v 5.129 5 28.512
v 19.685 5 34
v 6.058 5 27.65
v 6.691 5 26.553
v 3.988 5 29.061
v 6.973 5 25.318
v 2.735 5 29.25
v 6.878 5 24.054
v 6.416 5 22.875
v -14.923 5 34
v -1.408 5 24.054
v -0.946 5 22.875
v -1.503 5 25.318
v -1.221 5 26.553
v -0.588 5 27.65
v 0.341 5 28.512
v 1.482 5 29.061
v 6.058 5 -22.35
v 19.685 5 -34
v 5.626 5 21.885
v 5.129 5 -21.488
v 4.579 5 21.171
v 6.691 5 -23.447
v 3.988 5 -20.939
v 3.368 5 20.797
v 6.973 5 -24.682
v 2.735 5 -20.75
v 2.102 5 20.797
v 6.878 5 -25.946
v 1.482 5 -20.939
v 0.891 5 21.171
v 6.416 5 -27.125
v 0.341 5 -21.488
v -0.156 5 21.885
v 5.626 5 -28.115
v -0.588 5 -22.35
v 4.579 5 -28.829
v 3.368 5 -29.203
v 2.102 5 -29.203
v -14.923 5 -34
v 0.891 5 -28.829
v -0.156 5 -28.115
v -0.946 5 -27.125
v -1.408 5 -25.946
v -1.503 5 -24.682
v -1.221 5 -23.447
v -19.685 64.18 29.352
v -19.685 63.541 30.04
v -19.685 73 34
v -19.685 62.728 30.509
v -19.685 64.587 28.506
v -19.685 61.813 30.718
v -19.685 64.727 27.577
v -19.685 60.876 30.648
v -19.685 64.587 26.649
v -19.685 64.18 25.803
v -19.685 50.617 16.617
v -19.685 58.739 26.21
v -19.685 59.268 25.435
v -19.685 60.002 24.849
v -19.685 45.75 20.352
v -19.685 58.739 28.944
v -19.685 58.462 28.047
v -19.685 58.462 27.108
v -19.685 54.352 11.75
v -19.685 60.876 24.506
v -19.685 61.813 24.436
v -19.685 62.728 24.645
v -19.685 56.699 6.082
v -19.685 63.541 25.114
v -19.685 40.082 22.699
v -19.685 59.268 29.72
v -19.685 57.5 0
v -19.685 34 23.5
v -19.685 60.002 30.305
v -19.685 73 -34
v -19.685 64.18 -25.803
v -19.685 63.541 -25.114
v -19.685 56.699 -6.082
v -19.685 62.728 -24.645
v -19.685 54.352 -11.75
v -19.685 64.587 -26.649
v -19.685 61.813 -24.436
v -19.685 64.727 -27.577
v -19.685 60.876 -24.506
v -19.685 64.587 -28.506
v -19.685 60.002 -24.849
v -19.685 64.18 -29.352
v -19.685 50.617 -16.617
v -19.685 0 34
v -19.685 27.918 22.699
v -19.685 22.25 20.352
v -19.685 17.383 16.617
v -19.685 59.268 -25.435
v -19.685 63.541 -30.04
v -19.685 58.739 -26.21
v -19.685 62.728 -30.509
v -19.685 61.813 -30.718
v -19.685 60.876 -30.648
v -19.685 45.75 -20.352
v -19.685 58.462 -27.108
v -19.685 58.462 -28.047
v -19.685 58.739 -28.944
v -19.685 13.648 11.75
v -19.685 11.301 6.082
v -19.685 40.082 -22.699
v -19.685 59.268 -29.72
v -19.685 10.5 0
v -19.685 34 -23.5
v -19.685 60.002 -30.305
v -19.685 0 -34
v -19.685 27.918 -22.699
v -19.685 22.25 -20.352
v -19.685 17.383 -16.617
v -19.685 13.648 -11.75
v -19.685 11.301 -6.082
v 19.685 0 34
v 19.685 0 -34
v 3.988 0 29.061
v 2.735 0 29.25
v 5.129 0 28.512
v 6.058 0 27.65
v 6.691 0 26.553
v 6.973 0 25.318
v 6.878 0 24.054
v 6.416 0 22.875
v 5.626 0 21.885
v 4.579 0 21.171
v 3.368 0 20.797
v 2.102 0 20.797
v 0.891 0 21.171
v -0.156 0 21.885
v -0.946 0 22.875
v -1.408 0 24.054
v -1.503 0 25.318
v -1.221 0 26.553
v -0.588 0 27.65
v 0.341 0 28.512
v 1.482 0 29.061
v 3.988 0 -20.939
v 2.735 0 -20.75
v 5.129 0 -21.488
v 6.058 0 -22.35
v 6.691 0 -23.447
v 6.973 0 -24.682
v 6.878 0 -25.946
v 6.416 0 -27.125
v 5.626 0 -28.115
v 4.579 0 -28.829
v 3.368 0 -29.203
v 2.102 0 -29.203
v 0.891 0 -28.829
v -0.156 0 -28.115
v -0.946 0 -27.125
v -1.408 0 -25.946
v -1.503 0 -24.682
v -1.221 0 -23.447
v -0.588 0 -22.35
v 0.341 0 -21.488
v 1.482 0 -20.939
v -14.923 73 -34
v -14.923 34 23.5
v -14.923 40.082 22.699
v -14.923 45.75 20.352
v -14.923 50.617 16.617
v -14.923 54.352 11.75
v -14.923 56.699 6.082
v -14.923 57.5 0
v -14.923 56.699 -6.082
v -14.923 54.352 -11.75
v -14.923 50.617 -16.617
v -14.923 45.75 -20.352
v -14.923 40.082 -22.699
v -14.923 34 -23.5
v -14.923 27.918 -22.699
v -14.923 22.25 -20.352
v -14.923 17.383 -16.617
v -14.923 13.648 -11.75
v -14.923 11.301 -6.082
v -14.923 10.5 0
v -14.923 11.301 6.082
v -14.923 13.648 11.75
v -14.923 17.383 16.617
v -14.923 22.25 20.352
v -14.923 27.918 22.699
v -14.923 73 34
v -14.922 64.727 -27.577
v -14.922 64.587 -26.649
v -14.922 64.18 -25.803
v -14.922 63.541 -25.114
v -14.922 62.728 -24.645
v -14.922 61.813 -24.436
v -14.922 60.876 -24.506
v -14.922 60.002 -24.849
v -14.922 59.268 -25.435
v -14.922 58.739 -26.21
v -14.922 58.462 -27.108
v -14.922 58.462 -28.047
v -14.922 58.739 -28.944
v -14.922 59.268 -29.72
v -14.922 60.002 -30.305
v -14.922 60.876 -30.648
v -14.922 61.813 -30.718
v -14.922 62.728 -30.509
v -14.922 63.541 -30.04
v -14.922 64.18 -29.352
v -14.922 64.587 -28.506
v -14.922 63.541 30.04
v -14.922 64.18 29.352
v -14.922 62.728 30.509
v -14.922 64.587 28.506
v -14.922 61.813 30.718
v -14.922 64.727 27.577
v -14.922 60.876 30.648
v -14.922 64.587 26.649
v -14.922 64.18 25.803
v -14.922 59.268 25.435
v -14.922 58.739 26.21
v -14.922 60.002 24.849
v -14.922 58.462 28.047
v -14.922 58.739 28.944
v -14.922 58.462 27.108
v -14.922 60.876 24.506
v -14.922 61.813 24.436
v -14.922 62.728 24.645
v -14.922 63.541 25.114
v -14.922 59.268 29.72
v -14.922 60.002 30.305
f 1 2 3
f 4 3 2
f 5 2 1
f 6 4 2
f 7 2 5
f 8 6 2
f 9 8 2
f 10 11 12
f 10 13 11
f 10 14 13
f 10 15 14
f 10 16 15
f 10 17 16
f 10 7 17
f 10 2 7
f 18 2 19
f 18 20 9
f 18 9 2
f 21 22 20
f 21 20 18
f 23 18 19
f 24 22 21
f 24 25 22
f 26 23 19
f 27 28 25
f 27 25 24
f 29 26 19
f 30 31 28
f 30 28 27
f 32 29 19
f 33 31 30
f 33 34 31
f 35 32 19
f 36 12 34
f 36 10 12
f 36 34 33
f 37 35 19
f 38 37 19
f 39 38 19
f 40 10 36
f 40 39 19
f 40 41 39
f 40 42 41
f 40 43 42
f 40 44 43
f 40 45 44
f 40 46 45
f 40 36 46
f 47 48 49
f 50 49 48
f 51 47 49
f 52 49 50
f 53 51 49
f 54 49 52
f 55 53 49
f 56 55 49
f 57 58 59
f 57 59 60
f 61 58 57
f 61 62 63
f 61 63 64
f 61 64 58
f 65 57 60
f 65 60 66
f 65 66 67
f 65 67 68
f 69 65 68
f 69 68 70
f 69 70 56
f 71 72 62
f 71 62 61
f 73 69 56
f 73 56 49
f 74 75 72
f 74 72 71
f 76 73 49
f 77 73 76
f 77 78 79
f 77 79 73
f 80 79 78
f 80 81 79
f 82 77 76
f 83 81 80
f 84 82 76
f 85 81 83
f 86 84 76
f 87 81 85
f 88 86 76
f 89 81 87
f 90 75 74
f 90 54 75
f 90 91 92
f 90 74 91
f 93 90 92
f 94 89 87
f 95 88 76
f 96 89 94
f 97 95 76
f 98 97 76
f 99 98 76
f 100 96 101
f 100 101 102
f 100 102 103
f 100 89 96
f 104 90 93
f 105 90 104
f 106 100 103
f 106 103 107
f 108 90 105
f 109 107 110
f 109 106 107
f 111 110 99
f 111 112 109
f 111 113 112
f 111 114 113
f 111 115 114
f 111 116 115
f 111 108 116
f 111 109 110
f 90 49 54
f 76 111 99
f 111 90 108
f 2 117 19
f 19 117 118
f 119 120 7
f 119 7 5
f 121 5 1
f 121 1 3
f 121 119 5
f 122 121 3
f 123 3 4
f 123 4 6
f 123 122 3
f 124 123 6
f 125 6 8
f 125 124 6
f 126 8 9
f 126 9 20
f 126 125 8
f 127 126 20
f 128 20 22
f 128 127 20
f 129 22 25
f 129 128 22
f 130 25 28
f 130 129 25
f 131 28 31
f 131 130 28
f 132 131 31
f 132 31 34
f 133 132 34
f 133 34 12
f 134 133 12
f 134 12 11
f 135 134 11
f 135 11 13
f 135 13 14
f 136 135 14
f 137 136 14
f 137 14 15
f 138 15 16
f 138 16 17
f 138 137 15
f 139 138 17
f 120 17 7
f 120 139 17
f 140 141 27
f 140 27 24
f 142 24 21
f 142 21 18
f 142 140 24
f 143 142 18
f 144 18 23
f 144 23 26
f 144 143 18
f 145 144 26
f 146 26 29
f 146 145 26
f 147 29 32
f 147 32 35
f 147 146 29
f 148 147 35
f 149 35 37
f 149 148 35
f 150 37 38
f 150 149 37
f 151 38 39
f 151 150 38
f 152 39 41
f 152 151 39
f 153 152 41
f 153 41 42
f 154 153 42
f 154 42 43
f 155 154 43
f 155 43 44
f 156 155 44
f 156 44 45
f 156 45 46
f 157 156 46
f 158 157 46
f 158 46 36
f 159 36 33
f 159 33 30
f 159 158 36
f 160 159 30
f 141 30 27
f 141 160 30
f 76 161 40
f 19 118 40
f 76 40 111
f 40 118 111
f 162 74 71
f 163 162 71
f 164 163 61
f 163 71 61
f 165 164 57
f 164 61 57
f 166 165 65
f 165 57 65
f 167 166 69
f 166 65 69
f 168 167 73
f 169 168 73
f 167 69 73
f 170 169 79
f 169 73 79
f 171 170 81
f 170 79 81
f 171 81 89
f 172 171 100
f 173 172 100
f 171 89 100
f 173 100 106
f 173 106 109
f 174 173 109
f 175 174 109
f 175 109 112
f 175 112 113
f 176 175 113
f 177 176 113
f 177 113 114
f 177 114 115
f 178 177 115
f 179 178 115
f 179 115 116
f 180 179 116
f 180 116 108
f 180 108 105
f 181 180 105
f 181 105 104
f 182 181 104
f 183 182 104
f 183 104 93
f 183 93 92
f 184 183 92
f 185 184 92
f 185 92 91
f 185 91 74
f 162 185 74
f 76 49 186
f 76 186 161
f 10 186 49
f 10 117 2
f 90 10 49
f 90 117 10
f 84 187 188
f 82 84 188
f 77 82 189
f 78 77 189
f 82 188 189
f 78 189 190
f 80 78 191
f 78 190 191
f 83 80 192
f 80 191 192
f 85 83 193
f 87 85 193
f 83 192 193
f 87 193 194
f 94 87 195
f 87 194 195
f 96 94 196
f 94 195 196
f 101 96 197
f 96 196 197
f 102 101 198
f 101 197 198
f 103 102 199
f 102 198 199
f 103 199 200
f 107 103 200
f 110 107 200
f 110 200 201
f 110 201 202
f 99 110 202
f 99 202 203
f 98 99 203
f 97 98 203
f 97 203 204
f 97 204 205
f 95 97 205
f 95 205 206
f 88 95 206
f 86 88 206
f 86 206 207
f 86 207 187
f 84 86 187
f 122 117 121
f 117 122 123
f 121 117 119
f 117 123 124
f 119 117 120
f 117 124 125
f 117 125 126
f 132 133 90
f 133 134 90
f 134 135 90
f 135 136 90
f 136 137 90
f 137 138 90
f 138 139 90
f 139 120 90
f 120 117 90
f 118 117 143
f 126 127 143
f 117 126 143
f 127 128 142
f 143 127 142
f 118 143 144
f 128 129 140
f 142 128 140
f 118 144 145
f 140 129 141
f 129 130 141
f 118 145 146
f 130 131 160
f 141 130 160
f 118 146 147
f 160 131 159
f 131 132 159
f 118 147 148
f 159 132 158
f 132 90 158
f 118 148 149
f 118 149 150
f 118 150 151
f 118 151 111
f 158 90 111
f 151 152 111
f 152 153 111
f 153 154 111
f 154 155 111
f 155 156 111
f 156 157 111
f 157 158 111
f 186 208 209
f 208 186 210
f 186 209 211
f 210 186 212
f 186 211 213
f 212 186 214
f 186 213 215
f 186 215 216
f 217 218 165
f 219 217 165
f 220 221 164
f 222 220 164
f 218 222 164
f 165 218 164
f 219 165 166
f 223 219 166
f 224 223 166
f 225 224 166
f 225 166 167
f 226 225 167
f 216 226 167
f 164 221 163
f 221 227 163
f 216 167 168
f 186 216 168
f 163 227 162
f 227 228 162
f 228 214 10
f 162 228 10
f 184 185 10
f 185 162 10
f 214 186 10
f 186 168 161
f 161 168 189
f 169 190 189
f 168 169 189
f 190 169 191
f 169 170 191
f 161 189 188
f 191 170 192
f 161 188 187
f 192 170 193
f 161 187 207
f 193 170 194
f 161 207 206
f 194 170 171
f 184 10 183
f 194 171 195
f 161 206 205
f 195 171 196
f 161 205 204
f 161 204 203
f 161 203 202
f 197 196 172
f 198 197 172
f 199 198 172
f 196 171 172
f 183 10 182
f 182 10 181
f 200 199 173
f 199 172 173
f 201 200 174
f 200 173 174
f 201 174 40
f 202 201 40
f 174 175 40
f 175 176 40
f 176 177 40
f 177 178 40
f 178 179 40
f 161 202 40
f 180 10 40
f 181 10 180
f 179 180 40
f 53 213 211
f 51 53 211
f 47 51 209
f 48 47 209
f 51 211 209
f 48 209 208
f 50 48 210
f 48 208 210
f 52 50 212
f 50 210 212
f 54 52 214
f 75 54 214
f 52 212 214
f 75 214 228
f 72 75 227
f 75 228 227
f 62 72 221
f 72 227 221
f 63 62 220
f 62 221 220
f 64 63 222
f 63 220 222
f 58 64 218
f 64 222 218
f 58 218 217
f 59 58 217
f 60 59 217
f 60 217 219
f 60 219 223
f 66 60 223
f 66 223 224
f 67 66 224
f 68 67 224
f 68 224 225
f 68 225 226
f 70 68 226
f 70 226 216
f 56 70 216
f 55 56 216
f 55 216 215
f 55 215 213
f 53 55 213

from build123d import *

# Parameters (mm, degrees)
SKETCH1_W           = 68
SKETCH1_H           = 39.37
SKETCH1_R           = 4.25
BOSS_EXTRUDE1_DEPTH = 5
SKETCH2_W           = 68
SKETCH2_H           = 4.7625
BOSS_EXTRUDE2_DEPTH = 68
SKETCH4_R           = 3.15
CUT_EXTRUDE2_DEPTH  = 88.650893072
SKETCH14_R          = 23.5
CUT_EXTRUDE3_DEPTH  = 90.638144224


with BuildPart() as part:
    # Sketch1 → Boss-Extrude1 (new body)
    with BuildSketch(Plane(origin=(0, 0, 0), x_dir=(0, 0, -1), z_dir=(0, 1, 0))):
        Rectangle(SKETCH1_W, SKETCH1_H)
        with Locations((-25, -2.735)):
            Circle(SKETCH1_R, mode=Mode.SUBTRACT)
        with Locations((25, -2.735)):
            Circle(SKETCH1_R, mode=Mode.SUBTRACT)
    extrude(amount=BOSS_EXTRUDE1_DEPTH)

    # Sketch2 → Boss-Extrude2 (add)
    with BuildSketch(Plane(origin=(0, 5, 0), x_dir=(0, 0, -1), z_dir=(0, 1, 0))):
        with Locations((0, 17.30375)):
            Rectangle(SKETCH2_W, SKETCH2_H)
    extrude(amount=BOSS_EXTRUDE2_DEPTH)

    # Sketch4 → Cut-Extrude2 (cut, through all)
    with BuildSketch(Plane(origin=(-14.9225, 0, 0), x_dir=(0, 0, -1), z_dir=(1, 0, 0))):
        with Locations((-27.577164466, 61.577164466)):
            Circle(SKETCH4_R)
        with Locations((27.577164466, 61.577164466)):
            Circle(SKETCH4_R)
    extrude(amount=-CUT_EXTRUDE2_DEPTH, mode=Mode.SUBTRACT)

    # Sketch14 → Cut-Extrude3 (cut, through all)
    with BuildSketch(Plane.ZY.offset(19.685)):
        with Locations((0, 34)):
            Circle(SKETCH14_R)
    extrude(amount=-CUT_EXTRUDE3_DEPTH, mode=Mode.SUBTRACT)


solid = part.part
